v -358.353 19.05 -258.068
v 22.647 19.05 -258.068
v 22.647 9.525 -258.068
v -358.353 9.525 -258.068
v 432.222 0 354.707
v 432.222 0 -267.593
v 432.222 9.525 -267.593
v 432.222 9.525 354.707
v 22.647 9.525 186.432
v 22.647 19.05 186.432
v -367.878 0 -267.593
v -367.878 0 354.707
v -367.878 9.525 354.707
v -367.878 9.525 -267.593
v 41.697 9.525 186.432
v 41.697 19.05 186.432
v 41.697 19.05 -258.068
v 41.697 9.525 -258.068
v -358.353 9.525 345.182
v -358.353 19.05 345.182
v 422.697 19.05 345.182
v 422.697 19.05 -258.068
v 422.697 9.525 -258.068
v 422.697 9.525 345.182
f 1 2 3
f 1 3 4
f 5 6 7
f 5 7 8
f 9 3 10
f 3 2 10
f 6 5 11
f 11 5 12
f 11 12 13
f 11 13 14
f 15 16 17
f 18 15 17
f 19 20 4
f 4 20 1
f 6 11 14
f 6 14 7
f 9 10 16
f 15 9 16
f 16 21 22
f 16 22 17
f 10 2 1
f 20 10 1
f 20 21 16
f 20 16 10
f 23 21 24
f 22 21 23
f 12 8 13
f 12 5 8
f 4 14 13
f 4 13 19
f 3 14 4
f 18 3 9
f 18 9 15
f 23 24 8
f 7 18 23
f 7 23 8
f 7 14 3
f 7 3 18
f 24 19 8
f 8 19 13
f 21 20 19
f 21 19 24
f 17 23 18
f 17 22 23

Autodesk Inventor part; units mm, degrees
ref_plane "YZ Plane" through (0, 0, 0) normal (1, 0, 0) x (0, 1, 0)
ref_plane "XZ Plane" through (0, 0, 0) normal (0, 1, 0) x (-1, 0, 0)
ref_plane "XY Plane" through (0, 0, 0) normal (0, 0, 1) x (1, 0, 0)
sketch "Sketch1" plane through (0, 0, 0) normal (0, 1, 0) x (-1, 0, 0)
  line L0 (367.8783, -267.593) -> (-432.2217, -267.593)
  line L1 (-432.2217, -267.593) -> (-432.2217, 354.707)
  line L2 (-432.2217, 354.707) -> (367.8783, 354.707)
  line L3 (367.8783, 354.707) -> (367.8783, -267.593)
  point P0 (0, 0)
  dimension "d0" = 622.3
  dimension "d1" = 800.1
extrude "Board" add sketch "Sketch1" along normal blind 19.05
sketch "Sketch3" plane through (0, 19.05, 0) normal (0, 1, 0) x (1, 0, 0)
  line L0 (432.2217, -354.707) -> (432.2217, 267.593) projected
  line L1 (22.6467, -186.432) -> (41.6967, -186.432)
  line L2 (41.6967, -186.432) -> (41.6967, 267.593)
  line L3 (41.6967, 267.593) -> (22.6467, 267.593)
  line L4 (22.6467, 267.593) -> (22.6467, -186.432)
  line L5 (432.2217, 267.593) -> (-367.8783, 267.593) projected
  line L6 (-367.8783, 267.593) -> (-367.8783, -354.707) projected
  point P0 (0, 0)
  dimension "d17" = 19.05
  dimension "d26" = 454.025
  dimension "d27" = 390.525
extrude "Vertical Wall Dado Cuts" cut sketch "Sketch3" against normal blind 9.525
sketch "Sketch5" plane through (0, 19.05, 0) normal (0, 1, 0) x (1, 0, 0)
  line L0 (-367.8783, -354.707) -> (432.2217, -354.707) projected
  line L1 (432.2217, -354.707) -> (422.6967, -354.707)
  line L2 (422.6967, -354.707) -> (422.6967, 267.593)
  line L3 (422.6967, 267.593) -> (432.2217, 267.593)
  line L4 (432.2217, 267.593) -> (432.2217, -354.707)
  line L5 (432.2217, 267.593) -> (-367.8783, 267.593) projected
  line L6 (-367.8783, -354.707) -> (-358.3533, -354.707)
  line L7 (-358.3533, -354.707) -> (-358.3533, 267.593)
  line L8 (-358.3533, 267.593) -> (-367.8783, 267.593)
  line L9 (-367.8783, 267.593) -> (-367.8783, -354.707)
  line L10 (432.2217, 267.593) -> (-367.8783, 267.593) projected
  line L11 (432.2217, -354.707) -> (-367.8783, -354.707)
  line L12 (-367.8783, -354.707) -> (-367.8783, -345.182)
  line L13 (-367.8783, -345.182) -> (432.2217, -345.182)
  line L14 (432.2217, -345.182) -> (432.2217, -354.707)
  line L15 (-367.8783, 267.593) -> (432.2217, 267.593)
  line L16 (432.2217, 267.593) -> (432.2217, 258.068)
  line L17 (432.2217, 258.068) -> (-367.8783, 258.068)
  line L18 (-367.8783, 258.068) -> (-367.8783, 267.593)
  line L19 (432.2217, -354.707) -> (432.2217, 267.593) projected
  point P0 (0, 0)
  point P1 (422.6967, 267.593)
  point P2 (22.6467, 267.593)
  point P3 (-348.8283, 267.593)
  dimension "d22" = 9.525
extrude "Perimeter rabbit dado" cut sketch "Sketch5" against normal blind 9.525 contours L9 L13 L7 L0 | L7 L13 L2 L0 | L9 L17 L7 L13 | L2 L13 L4 L0 | L9 L5 L7 L17 | L2 L17 L4 L13 | L7 L5 L2 L17 | L2 L3 L4 L17
equation "\"d27\" = -0.5 * d17 + 0.5 * d1"
properties part number "Top"
